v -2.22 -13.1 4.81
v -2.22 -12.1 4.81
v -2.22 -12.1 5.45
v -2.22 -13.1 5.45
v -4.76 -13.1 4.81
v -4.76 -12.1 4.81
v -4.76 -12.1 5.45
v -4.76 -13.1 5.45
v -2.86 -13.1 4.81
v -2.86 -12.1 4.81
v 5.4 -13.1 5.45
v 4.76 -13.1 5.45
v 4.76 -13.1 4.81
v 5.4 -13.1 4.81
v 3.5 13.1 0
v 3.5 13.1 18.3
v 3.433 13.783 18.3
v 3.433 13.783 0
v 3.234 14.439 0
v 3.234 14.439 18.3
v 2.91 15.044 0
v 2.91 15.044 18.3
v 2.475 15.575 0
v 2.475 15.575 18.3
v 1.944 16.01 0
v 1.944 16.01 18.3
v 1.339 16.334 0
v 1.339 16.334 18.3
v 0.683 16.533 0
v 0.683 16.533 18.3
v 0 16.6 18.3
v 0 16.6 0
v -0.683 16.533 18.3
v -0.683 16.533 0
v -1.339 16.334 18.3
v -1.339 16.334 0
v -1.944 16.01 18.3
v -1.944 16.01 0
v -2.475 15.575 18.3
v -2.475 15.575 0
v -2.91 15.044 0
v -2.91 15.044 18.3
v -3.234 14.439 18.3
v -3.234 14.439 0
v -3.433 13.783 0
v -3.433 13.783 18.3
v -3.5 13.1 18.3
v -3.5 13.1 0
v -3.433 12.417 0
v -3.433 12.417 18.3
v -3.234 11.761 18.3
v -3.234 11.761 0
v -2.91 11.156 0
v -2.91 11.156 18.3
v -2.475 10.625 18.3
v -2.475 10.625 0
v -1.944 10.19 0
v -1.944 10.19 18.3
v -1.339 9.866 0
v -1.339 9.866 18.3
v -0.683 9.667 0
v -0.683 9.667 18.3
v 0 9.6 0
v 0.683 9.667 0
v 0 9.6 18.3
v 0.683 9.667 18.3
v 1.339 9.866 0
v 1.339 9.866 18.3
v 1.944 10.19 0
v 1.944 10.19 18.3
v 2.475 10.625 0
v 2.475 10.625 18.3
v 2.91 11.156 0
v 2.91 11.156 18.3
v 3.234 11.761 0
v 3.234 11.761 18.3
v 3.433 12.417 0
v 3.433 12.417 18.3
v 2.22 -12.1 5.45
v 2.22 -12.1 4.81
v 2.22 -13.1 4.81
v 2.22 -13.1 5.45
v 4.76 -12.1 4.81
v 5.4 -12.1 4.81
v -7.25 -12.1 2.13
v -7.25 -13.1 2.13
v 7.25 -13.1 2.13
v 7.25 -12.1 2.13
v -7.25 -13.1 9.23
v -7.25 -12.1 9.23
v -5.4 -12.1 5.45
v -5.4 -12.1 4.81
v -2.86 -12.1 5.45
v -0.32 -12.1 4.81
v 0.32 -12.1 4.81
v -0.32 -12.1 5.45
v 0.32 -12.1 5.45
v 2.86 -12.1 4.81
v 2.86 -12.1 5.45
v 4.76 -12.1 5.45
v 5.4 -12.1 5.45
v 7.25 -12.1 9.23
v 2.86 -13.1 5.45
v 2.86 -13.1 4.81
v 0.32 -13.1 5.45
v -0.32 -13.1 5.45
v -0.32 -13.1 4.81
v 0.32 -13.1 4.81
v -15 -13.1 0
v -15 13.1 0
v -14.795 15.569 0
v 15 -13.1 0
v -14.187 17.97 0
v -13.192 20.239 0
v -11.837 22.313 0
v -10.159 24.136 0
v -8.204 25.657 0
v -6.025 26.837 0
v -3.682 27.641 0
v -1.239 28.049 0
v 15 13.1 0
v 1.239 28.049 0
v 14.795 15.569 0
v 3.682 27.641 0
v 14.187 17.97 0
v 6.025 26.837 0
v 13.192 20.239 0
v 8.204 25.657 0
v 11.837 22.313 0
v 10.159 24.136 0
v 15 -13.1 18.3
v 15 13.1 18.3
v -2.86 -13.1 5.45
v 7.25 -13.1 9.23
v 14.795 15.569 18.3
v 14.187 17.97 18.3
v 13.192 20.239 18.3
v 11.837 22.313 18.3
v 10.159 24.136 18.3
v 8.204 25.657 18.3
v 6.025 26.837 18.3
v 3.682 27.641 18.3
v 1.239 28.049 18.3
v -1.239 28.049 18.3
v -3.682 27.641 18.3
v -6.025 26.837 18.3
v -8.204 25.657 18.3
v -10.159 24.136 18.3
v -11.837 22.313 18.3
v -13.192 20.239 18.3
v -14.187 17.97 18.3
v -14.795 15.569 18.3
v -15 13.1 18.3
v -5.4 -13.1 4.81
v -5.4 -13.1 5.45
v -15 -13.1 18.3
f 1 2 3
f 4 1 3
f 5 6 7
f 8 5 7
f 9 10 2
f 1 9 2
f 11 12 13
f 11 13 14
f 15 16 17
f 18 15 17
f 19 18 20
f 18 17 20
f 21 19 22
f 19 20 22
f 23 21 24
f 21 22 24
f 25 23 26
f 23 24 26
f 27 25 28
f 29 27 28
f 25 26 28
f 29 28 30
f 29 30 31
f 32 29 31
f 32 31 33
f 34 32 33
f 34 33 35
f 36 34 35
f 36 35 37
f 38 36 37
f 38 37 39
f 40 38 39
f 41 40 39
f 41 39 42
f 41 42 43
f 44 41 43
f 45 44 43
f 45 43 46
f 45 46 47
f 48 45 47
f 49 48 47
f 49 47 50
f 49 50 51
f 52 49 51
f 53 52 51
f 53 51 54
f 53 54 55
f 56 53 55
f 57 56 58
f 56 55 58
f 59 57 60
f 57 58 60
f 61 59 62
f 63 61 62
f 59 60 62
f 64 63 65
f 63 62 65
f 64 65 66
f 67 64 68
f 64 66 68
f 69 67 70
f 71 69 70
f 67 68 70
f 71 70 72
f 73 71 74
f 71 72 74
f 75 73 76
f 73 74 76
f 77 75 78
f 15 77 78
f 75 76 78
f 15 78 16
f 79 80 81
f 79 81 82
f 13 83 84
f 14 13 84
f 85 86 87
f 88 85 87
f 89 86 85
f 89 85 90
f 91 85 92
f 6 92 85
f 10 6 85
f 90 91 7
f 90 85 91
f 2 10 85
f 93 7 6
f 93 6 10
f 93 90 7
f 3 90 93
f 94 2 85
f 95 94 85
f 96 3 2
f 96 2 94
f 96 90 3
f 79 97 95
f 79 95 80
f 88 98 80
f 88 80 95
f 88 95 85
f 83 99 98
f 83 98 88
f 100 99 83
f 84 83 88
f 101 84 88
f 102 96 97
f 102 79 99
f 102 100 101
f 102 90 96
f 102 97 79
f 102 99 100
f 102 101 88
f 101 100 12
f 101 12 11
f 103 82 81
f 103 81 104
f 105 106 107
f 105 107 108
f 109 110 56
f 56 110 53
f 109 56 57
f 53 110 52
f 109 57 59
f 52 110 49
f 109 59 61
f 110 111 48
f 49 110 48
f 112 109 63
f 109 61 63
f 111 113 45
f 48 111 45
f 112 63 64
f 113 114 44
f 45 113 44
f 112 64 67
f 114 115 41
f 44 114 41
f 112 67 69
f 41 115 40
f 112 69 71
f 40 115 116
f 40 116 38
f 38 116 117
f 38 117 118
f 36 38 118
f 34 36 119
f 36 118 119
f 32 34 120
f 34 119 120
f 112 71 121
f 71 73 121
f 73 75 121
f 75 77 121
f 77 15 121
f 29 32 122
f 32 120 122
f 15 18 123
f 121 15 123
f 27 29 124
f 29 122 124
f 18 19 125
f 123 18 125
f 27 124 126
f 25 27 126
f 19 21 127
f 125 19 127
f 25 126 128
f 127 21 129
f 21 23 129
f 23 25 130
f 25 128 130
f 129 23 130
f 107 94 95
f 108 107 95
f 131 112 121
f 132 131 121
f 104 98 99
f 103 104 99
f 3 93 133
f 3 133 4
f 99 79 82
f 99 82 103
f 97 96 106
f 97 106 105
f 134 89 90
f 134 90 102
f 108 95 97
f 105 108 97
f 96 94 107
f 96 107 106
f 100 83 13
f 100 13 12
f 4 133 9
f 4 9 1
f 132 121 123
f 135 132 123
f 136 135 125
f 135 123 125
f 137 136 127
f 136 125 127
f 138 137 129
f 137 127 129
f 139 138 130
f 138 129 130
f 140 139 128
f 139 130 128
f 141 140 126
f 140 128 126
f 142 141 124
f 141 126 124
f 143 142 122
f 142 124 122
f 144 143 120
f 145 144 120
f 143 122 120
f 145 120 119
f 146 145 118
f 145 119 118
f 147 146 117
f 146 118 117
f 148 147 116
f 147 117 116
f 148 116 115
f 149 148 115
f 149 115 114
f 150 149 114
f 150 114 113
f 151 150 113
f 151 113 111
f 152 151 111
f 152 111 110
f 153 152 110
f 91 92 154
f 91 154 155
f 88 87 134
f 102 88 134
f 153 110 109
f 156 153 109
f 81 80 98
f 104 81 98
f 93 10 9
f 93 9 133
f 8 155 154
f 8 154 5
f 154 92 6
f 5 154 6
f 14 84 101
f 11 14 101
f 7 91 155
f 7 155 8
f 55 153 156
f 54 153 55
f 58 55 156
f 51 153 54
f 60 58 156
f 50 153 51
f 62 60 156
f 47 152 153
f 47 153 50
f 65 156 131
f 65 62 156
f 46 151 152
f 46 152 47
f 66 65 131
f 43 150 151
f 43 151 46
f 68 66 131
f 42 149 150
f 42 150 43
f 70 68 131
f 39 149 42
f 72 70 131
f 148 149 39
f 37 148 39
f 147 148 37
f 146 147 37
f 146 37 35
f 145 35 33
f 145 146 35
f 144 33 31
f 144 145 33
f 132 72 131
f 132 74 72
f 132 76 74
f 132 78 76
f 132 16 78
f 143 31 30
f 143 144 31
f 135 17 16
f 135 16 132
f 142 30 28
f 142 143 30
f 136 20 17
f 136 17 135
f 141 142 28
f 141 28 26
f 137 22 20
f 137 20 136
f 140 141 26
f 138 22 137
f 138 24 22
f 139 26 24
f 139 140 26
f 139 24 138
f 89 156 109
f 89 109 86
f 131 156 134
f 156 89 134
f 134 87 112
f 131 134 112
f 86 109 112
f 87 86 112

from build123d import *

# Parameters (mm, degrees)
BOSS_EXTRU_1_DEPTH      = 18.3
ESQUISSE2_W             = 14.5
ESQUISSE2_H             = 7.1
ENL_V_MAT_EXTRU_1_DEPTH = 1
ESQUISSE3_W             = 0.64
ESQUISSE3_H             = 0.64
BOSS_EXTRU_2_DEPTH      = 1
ESQUISSE4_R             = 3.5
ENL_V_MAT_EXTRU_2_DEPTH = 37.735541373


with BuildPart() as part:
    # Esquisse1 → Boss.-Extru.1 (new body)
    with BuildSketch(Plane.XY):
        with BuildLine():
            Line((-15, 13.1), (-15, -13.1))
            Line((-15, -13.1), (15, -13.1))
            Line((15, -13.1), (15, 13.1))
            ThreePointArc((15, 13.1), (0, 28.1), (-15, 13.1))
        make_face()
    extrude(amount=BOSS_EXTRU_1_DEPTH)

    # Esquisse2 → Enlèv. mat.-Extru.1 (cut)
    with BuildSketch(Plane.XZ.offset(13.1)):
        with Locations((0, 5.68)):
            Rectangle(ESQUISSE2_W, ESQUISSE2_H)
    extrude(amount=-ENL_V_MAT_EXTRU_1_DEPTH, mode=Mode.SUBTRACT)

    # Esquisse3 → Boss.-Extru.2 (add)
    with BuildSketch(Plane.XZ.offset(12.1)):
        with Locations((-5.08, 5.13)):
            Rectangle(ESQUISSE3_W, ESQUISSE3_H)
        with Locations((0, 5.13)):
            Rectangle(ESQUISSE3_W, ESQUISSE3_H)
        with Locations((2.54, 5.13)):
            Rectangle(ESQUISSE3_W, ESQUISSE3_H)
        with Locations((5.08, 5.13)):
            Rectangle(ESQUISSE3_W, ESQUISSE3_H)
        with Locations((-2.54, 5.13)):
            Rectangle(ESQUISSE3_W, ESQUISSE3_H)
    extrude(amount=BOSS_EXTRU_2_DEPTH)

    # Esquisse4 → Enlèv. mat.-Extru.2 (cut, through all)
    with BuildSketch(Plane.XY.offset(18.3)):
        with Locations((0, 13.1)):
            Circle(ESQUISSE4_R)
    extrude(amount=-ENL_V_MAT_EXTRU_2_DEPTH, mode=Mode.SUBTRACT)


solid = part.part
